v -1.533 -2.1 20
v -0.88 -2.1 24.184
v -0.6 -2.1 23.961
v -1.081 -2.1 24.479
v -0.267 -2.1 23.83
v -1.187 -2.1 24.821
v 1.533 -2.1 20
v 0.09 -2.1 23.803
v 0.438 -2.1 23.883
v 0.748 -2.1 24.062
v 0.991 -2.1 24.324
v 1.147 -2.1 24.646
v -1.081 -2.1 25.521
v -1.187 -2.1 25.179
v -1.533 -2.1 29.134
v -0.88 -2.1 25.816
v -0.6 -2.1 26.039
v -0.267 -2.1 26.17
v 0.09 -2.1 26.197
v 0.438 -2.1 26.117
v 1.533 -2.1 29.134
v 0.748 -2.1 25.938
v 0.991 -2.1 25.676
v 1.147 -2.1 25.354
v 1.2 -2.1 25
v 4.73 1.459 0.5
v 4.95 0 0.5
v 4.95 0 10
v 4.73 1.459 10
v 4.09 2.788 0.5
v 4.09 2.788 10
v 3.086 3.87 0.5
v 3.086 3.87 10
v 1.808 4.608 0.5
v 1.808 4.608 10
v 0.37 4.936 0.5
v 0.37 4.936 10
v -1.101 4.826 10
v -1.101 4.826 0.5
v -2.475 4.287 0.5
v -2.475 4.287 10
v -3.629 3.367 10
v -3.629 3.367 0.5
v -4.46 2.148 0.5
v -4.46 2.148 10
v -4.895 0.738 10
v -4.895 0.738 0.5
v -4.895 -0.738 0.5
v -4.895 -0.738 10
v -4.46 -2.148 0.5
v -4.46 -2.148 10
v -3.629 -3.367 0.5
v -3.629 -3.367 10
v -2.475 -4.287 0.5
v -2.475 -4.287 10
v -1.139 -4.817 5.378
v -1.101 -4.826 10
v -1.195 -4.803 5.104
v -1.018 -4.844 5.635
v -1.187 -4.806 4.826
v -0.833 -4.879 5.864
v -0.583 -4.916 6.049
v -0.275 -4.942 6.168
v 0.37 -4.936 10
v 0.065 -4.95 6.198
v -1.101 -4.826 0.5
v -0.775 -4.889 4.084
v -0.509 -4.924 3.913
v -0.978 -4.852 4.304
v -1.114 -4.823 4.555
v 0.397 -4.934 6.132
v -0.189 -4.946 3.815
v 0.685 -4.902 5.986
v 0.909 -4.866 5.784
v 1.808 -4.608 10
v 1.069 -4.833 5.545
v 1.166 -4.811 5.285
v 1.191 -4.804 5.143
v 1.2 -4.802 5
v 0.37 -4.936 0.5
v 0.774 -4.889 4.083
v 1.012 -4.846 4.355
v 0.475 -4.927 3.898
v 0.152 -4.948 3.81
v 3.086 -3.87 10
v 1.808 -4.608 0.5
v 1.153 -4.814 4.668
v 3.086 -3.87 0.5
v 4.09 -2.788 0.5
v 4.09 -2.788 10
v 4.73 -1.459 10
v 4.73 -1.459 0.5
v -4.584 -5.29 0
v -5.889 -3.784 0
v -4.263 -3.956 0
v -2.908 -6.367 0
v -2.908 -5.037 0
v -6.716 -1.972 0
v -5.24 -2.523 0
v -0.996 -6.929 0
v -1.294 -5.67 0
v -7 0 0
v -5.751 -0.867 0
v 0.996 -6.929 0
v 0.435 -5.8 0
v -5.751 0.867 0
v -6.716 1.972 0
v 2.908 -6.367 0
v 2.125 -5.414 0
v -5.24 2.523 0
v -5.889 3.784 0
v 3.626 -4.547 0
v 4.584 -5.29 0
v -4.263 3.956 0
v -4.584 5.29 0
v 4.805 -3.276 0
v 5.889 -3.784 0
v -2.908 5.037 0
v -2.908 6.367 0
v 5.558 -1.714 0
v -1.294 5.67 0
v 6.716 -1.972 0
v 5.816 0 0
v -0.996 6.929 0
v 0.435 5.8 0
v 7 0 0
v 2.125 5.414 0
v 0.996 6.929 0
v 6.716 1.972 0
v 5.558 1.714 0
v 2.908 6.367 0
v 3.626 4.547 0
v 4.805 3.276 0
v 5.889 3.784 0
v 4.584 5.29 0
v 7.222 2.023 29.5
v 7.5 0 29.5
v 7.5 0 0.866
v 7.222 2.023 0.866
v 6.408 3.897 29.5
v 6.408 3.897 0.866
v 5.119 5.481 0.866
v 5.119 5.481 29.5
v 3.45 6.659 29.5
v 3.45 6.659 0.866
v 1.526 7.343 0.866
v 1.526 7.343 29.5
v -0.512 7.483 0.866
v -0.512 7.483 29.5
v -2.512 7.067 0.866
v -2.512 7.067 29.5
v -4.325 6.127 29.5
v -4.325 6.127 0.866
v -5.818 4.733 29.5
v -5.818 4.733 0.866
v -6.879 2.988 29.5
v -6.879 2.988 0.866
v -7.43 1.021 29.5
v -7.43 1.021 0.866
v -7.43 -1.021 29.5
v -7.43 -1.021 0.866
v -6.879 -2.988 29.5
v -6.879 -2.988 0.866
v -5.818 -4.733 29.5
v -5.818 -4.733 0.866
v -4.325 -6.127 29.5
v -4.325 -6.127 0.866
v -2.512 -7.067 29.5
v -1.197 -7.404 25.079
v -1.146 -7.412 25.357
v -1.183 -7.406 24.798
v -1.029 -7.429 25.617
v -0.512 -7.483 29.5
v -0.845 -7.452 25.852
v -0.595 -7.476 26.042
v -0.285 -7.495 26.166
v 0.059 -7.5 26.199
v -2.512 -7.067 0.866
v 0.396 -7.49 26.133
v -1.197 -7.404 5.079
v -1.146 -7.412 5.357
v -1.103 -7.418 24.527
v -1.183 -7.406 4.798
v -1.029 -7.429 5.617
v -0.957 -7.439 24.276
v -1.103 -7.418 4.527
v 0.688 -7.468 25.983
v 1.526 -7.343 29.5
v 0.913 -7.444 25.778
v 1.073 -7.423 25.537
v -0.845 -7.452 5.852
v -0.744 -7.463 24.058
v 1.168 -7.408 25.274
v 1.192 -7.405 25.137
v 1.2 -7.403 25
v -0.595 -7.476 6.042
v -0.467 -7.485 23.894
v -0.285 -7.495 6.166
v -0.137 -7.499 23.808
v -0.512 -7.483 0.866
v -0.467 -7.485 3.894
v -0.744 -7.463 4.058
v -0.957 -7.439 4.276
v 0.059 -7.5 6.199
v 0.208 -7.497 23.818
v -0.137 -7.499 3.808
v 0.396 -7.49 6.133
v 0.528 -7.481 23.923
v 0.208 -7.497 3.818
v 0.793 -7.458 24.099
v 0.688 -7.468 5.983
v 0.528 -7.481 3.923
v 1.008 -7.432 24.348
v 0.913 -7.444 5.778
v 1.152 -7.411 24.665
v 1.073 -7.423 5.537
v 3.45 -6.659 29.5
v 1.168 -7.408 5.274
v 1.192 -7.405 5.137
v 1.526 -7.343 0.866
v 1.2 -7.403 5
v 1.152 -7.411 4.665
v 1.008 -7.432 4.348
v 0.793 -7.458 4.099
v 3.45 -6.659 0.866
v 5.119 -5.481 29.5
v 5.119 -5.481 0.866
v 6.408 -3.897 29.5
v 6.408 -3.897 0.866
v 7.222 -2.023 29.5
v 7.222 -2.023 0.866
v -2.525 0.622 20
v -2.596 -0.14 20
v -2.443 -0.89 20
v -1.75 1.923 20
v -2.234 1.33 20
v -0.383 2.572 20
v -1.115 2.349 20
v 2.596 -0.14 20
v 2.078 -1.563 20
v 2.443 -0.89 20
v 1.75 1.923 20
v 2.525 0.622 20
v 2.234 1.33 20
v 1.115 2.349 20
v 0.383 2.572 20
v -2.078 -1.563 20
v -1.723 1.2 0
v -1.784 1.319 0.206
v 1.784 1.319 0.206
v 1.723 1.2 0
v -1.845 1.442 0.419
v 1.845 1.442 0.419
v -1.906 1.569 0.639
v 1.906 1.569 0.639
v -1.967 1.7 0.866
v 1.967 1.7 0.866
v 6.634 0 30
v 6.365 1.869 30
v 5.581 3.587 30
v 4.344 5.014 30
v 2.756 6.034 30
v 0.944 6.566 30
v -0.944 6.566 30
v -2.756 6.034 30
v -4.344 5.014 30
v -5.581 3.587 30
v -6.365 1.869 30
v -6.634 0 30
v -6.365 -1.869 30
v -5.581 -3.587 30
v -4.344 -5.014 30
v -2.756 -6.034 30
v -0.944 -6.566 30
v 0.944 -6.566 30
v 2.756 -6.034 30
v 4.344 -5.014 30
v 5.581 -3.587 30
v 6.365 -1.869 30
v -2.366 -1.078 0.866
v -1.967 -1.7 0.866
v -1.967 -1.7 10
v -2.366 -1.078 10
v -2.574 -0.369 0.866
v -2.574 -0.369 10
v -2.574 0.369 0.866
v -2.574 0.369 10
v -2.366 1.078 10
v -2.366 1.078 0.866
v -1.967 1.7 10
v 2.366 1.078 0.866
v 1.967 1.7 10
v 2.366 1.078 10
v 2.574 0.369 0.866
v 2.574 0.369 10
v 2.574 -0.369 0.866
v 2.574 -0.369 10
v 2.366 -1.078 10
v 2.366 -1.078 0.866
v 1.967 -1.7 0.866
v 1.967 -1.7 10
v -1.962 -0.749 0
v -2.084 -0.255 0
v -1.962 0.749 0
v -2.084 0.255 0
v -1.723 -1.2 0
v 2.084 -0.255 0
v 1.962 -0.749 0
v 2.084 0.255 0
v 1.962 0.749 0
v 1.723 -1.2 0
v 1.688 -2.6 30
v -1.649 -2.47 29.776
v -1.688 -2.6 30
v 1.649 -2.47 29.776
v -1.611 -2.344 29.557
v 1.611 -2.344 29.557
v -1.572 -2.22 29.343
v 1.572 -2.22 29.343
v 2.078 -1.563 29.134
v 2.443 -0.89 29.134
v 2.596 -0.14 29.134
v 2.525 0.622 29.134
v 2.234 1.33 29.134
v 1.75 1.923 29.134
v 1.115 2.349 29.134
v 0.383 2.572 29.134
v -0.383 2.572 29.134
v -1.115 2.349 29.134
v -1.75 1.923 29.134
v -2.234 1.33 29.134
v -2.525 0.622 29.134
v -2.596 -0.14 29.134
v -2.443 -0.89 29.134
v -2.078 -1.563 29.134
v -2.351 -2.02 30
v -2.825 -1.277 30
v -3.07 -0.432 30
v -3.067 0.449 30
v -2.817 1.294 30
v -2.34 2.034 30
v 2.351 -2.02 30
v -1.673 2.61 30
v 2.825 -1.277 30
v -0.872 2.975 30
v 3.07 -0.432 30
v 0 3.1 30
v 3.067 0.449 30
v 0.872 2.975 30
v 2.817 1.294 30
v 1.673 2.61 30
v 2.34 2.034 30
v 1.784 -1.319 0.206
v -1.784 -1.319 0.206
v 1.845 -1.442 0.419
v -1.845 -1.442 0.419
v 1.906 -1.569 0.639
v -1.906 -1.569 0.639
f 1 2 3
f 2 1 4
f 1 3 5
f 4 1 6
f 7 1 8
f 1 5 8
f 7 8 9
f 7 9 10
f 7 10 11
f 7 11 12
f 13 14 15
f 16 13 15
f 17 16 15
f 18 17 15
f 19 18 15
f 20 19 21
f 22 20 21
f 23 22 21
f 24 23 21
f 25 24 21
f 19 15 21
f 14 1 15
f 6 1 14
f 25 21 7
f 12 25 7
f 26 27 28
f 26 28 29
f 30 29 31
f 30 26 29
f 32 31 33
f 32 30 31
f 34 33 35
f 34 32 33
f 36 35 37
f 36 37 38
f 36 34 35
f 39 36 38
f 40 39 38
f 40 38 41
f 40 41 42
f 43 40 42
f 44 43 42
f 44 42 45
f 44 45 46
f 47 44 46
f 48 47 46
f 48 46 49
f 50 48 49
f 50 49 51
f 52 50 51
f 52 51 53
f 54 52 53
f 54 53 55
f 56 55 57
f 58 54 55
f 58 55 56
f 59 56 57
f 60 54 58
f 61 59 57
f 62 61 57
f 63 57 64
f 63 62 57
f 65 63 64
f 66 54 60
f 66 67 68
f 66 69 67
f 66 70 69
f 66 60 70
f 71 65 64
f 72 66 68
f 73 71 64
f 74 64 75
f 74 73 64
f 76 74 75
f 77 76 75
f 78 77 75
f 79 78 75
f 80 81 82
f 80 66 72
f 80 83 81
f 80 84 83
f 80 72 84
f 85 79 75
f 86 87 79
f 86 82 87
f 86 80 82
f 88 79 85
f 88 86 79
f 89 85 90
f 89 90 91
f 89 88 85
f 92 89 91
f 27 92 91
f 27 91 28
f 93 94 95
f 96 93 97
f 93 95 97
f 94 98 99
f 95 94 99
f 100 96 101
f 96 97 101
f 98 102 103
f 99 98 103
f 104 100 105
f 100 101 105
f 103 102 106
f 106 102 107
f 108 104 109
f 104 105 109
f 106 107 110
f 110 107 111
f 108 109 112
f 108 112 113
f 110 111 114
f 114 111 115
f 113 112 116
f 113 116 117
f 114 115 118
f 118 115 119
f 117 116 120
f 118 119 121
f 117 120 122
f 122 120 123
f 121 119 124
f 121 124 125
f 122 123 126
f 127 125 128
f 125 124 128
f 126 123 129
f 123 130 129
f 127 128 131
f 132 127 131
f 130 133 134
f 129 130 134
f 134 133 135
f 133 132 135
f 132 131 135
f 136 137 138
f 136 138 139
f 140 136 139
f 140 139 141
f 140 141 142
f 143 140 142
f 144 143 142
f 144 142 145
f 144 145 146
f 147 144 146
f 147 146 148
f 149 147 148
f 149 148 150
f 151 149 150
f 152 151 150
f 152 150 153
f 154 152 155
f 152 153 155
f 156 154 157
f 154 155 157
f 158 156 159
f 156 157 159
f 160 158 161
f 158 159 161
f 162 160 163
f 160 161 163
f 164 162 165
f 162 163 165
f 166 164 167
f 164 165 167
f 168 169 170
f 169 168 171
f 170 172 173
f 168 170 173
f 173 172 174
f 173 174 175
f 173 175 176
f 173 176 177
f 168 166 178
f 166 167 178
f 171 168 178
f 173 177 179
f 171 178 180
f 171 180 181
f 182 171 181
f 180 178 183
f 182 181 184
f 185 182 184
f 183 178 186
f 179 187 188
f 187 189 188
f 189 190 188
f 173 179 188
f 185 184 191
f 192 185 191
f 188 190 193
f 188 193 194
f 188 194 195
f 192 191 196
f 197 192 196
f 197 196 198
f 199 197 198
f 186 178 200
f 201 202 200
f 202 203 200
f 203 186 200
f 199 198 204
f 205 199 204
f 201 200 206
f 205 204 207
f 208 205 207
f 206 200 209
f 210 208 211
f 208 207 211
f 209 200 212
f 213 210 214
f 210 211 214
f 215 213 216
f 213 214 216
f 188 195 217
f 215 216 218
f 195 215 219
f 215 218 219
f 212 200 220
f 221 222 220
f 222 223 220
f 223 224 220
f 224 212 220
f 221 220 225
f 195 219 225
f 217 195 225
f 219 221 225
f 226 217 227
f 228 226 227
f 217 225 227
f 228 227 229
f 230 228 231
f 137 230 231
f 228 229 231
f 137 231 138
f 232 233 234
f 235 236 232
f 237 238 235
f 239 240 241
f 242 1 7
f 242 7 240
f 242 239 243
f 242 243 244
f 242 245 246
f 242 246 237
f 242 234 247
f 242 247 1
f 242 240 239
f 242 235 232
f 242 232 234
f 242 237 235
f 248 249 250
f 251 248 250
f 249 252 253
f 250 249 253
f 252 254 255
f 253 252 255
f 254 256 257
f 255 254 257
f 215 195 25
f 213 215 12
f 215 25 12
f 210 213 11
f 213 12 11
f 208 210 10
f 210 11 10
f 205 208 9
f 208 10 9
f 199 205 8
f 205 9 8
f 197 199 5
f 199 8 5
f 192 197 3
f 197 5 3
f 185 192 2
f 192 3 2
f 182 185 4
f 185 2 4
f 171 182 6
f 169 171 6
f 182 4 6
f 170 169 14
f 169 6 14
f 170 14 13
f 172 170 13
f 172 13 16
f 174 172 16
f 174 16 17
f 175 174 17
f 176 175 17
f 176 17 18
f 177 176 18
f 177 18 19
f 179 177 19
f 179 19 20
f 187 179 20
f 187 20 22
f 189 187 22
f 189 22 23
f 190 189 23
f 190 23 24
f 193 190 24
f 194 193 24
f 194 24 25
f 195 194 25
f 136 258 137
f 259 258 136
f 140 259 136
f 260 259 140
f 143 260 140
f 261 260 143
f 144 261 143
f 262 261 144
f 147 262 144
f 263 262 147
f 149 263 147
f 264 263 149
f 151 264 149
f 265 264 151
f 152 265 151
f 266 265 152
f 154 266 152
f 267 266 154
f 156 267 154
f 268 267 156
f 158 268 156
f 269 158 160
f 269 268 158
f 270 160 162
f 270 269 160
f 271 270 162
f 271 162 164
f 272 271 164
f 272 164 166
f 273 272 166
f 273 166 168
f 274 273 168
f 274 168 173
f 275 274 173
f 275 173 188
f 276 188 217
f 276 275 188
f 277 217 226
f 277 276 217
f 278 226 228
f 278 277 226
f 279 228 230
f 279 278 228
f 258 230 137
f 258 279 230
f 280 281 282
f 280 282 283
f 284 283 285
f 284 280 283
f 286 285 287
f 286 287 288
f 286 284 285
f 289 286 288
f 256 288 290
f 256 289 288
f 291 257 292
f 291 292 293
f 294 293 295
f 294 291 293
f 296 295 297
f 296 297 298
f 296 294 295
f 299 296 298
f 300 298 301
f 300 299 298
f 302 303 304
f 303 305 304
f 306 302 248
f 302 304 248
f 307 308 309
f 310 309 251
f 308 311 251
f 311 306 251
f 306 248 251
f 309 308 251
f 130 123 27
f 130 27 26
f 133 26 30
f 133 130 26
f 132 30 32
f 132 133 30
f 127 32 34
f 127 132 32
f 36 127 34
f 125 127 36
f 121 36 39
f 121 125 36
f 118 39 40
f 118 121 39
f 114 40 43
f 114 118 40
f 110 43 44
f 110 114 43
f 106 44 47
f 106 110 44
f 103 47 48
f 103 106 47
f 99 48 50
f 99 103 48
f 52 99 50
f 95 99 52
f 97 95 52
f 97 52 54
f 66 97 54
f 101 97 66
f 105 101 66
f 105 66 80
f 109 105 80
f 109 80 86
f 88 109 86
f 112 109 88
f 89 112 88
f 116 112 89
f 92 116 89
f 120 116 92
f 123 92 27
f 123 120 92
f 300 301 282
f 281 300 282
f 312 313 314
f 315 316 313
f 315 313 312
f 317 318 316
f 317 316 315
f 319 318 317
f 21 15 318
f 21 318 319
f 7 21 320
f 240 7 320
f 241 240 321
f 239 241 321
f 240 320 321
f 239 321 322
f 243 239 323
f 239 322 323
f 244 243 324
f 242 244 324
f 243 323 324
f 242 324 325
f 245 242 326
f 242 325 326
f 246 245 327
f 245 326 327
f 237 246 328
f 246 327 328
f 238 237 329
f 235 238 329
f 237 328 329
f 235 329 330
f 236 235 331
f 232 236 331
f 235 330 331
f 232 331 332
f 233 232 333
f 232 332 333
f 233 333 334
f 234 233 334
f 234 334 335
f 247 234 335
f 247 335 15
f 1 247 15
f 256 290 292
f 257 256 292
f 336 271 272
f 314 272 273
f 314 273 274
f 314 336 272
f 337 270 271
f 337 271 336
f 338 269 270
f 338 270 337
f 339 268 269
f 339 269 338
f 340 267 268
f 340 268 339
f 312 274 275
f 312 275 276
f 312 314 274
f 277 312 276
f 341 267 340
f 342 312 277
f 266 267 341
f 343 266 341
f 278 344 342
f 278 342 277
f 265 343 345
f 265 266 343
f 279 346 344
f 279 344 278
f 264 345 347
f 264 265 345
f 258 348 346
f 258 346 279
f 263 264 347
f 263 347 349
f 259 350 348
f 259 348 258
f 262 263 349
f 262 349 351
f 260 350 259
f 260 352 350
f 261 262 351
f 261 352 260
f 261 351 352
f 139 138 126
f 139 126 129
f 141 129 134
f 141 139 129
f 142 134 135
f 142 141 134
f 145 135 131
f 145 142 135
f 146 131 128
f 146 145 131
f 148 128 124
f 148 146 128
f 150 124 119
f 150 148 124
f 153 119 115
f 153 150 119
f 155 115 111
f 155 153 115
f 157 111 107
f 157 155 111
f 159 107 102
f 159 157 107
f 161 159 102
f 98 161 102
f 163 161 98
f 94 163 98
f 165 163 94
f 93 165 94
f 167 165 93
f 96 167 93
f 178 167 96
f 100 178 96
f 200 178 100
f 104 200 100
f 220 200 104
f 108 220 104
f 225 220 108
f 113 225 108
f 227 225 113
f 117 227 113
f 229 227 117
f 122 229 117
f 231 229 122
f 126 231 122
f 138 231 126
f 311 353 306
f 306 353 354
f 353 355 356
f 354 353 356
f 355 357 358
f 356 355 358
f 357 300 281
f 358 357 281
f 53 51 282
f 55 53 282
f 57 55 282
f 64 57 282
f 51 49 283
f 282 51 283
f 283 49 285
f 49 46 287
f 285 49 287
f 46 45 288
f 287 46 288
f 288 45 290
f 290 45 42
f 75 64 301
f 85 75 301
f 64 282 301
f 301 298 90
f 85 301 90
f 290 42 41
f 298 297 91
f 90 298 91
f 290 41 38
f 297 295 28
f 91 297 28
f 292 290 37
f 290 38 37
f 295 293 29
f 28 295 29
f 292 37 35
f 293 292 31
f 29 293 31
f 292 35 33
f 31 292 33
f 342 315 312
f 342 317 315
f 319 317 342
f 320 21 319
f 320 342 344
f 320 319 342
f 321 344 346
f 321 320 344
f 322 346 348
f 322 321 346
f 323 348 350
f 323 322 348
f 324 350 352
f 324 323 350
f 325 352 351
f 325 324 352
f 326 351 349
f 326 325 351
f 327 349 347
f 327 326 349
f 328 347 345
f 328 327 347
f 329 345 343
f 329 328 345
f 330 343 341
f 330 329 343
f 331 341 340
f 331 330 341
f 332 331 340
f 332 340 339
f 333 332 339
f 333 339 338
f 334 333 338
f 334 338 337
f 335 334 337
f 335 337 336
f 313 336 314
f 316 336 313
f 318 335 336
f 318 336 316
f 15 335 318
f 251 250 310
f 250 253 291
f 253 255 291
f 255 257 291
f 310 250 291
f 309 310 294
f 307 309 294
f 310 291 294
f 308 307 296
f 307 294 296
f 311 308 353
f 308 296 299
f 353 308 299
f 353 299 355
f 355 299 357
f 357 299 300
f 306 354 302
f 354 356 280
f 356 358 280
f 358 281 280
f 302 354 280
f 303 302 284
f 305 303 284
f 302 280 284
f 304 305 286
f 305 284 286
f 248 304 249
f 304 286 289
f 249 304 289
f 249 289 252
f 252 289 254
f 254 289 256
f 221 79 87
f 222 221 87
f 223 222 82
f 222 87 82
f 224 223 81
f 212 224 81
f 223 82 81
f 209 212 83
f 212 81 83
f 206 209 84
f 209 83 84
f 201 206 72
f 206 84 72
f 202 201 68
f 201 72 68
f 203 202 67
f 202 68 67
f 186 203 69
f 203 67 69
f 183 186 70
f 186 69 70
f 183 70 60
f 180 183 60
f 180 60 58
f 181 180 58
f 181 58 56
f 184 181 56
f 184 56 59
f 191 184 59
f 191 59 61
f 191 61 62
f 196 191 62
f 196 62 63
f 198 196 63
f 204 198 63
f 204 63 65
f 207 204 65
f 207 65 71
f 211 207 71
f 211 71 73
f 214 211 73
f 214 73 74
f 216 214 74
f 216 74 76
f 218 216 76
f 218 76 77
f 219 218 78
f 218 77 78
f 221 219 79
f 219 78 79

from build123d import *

# Parameters (mm, degrees)
OD_PROFILE_SKETCH_R                = 7.5
OD_BOSS_EXTRUDE_DEPTH              = 30
WHEEL_SHAFT_PROFILE_SKETCH_R       = 4.95
WHEEL_SHAFT_CUT_EXTRUDE_DEPTH      = 10
NEMA17_SHAFT_CUT_EXTRUDE_DEPTH     = 10
TAP_DRILL_FOR_M3X0_5_D             = 2.4
TAP_DRILL_FOR_M3X0_5_DEPTH         = 5.4
EDGE_CHAMFER_1MM_X_60_SIZE         = 0.5
EDGE_CHAMFER_1MM_X_60_SIZE2        = 0.866025404
EDGE_CHAMFER_1MM_X_60_PART_2_SIZE  = 0.5
EDGE_CHAMFER_1MM_X_60_PART_2_SIZE2 = 0.866025404
EDGE_CHAMFER_1MM_X_60_PART_3_SIZE  = 0.5
EDGE_CHAMFER_1MM_X_60_PART_3_SIZE2 = 0.866025404
EDGE_CHAMFER_1MM_X_60_PART_4_SIZE  = 0.5
EDGE_CHAMFER_1MM_X_60_PART_4_SIZE2 = 0.866025404
EDGE_CHAMFER_1MM_X_60_PART_5_SIZE  = 0.5
EDGE_CHAMFER_1MM_X_60_PART_5_SIZE2 = 0.866025404


with BuildPart() as part:
    # OD Profile Sketch → OD Boss-Extrude (new body)
    with BuildSketch(Plane.XY):
        Circle(OD_PROFILE_SKETCH_R)
    extrude(amount=OD_BOSS_EXTRUDE_DEPTH)

    # Wheel Shaft Profile Sketch → Wheel Shaft Cut-Extrude (cut)
    with BuildSketch(Plane.XY):
        Circle(WHEEL_SHAFT_PROFILE_SKETCH_R)
        with BuildLine():
            Line((1.967231557, -1.7), (-1.967231557, -1.7))
            ThreePointArc((-1.967231557, -1.7), (-2.6, 0), (-1.967231557, 1.7))
            Line((-1.967231557, 1.7), (1.967231557, 1.7))
            ThreePointArc((1.967231557, 1.7), (2.6, 0), (1.967231557, -1.7))
        make_face(mode=Mode.SUBTRACT)
    extrude(amount=WHEEL_SHAFT_CUT_EXTRUDE_DEPTH, mode=Mode.SUBTRACT)

    # NEMA17 Shaft Profile Sketch → NEMA17 Shaft Cut-Extrude (cut)
    with BuildSketch(Plane.XY.offset(30)):
        with BuildLine():
            Line((-1.532970972, -2.1), (1.532970972, -2.1))
            ThreePointArc((1.532970972, -2.1), (0, 2.6), (-1.532970972, -2.1))
        make_face()
    extrude(amount=-NEMA17_SHAFT_CUT_EXTRUDE_DEPTH, mode=Mode.SUBTRACT)

    # Tap Drill for M3x0.5
    with Locations(Plane(origin=(0, -7.5, 0), x_dir=(-1, 0, 0), z_dir=(0, -1, 0))):
        with Locations((0, -25), (0, -5)):
            Hole(TAP_DRILL_FOR_M3X0_5_D / 2, depth=TAP_DRILL_FOR_M3X0_5_DEPTH)

    # Edge Chamfer (1mm x 60)
    edge_chamfer_1mm_x_60_edges = [part.edges().sort_by_distance(p)[0] for p in [
        (-7.5, 0, 0),
    ]]
    edge_chamfer_1mm_x_60_side = [part.faces().sort_by_distance(p)[0] for p in [
        (-7.287867966, 0, 0),
    ]]
    chamfer(edge_chamfer_1mm_x_60_edges, length=EDGE_CHAMFER_1MM_X_60_SIZE, length2=EDGE_CHAMFER_1MM_X_60_SIZE2, reference=edge_chamfer_1mm_x_60_side[0])

    # Edge Chamfer (1mm x 60) part 2
    edge_chamfer_1mm_x_60_part_2_edges = [part.edges().sort_by_distance(p)[0] for p in [
        (0, 2.6, 30),
        (0, -2.1, 30),
    ]]
    edge_chamfer_1mm_x_60_part_2_side = [part.faces().sort_by_distance(p)[0] for p in [
        (-7.287867966, 0, 30),
    ]]
    chamfer(edge_chamfer_1mm_x_60_part_2_edges, length=EDGE_CHAMFER_1MM_X_60_PART_2_SIZE, length2=EDGE_CHAMFER_1MM_X_60_PART_2_SIZE2, reference=edge_chamfer_1mm_x_60_part_2_side[0])

    # Edge Chamfer (1mm x 60) part 3
    edge_chamfer_1mm_x_60_part_3_edges = [part.edges().sort_by_distance(p)[0] for p in [
        (-7.5, 0, 30),
    ]]
    edge_chamfer_1mm_x_60_part_3_side = [part.faces().sort_by_distance(p)[0] for p in [
        (-7.5, 0, 15),
    ]]
    chamfer(edge_chamfer_1mm_x_60_part_3_edges, length=EDGE_CHAMFER_1MM_X_60_PART_3_SIZE, length2=EDGE_CHAMFER_1MM_X_60_PART_3_SIZE2, reference=edge_chamfer_1mm_x_60_part_3_side[0])

    # Edge Chamfer (1mm x 60) part 4
    edge_chamfer_1mm_x_60_part_4_edges = [part.edges().sort_by_distance(p)[0] for p in [
        (2.6, 0, 0),
        (0, 1.7, 0),
        (-2.6, 0, 0),
        (0, -1.7, 0),
    ]]
    edge_chamfer_1mm_x_60_part_4_side = [part.faces().sort_by_distance(p)[0] for p in [
        (0, 0, 0),
    ]]
    chamfer(edge_chamfer_1mm_x_60_part_4_edges, length=EDGE_CHAMFER_1MM_X_60_PART_4_SIZE, length2=EDGE_CHAMFER_1MM_X_60_PART_4_SIZE2, reference=edge_chamfer_1mm_x_60_part_4_side[0])

    # Edge Chamfer (1mm x 60) part 5
    edge_chamfer_1mm_x_60_part_5_edges = [part.edges().sort_by_distance(p)[0] for p in [
        (-4.95, 0, 0),
    ]]
    edge_chamfer_1mm_x_60_part_5_side = [part.faces().sort_by_distance(p)[0] for p in [
        (-4.95, 0, 5),
    ]]
    chamfer(edge_chamfer_1mm_x_60_part_5_edges, length=EDGE_CHAMFER_1MM_X_60_PART_5_SIZE, length2=EDGE_CHAMFER_1MM_X_60_PART_5_SIZE2, reference=edge_chamfer_1mm_x_60_part_5_side[0])


solid = part.part
